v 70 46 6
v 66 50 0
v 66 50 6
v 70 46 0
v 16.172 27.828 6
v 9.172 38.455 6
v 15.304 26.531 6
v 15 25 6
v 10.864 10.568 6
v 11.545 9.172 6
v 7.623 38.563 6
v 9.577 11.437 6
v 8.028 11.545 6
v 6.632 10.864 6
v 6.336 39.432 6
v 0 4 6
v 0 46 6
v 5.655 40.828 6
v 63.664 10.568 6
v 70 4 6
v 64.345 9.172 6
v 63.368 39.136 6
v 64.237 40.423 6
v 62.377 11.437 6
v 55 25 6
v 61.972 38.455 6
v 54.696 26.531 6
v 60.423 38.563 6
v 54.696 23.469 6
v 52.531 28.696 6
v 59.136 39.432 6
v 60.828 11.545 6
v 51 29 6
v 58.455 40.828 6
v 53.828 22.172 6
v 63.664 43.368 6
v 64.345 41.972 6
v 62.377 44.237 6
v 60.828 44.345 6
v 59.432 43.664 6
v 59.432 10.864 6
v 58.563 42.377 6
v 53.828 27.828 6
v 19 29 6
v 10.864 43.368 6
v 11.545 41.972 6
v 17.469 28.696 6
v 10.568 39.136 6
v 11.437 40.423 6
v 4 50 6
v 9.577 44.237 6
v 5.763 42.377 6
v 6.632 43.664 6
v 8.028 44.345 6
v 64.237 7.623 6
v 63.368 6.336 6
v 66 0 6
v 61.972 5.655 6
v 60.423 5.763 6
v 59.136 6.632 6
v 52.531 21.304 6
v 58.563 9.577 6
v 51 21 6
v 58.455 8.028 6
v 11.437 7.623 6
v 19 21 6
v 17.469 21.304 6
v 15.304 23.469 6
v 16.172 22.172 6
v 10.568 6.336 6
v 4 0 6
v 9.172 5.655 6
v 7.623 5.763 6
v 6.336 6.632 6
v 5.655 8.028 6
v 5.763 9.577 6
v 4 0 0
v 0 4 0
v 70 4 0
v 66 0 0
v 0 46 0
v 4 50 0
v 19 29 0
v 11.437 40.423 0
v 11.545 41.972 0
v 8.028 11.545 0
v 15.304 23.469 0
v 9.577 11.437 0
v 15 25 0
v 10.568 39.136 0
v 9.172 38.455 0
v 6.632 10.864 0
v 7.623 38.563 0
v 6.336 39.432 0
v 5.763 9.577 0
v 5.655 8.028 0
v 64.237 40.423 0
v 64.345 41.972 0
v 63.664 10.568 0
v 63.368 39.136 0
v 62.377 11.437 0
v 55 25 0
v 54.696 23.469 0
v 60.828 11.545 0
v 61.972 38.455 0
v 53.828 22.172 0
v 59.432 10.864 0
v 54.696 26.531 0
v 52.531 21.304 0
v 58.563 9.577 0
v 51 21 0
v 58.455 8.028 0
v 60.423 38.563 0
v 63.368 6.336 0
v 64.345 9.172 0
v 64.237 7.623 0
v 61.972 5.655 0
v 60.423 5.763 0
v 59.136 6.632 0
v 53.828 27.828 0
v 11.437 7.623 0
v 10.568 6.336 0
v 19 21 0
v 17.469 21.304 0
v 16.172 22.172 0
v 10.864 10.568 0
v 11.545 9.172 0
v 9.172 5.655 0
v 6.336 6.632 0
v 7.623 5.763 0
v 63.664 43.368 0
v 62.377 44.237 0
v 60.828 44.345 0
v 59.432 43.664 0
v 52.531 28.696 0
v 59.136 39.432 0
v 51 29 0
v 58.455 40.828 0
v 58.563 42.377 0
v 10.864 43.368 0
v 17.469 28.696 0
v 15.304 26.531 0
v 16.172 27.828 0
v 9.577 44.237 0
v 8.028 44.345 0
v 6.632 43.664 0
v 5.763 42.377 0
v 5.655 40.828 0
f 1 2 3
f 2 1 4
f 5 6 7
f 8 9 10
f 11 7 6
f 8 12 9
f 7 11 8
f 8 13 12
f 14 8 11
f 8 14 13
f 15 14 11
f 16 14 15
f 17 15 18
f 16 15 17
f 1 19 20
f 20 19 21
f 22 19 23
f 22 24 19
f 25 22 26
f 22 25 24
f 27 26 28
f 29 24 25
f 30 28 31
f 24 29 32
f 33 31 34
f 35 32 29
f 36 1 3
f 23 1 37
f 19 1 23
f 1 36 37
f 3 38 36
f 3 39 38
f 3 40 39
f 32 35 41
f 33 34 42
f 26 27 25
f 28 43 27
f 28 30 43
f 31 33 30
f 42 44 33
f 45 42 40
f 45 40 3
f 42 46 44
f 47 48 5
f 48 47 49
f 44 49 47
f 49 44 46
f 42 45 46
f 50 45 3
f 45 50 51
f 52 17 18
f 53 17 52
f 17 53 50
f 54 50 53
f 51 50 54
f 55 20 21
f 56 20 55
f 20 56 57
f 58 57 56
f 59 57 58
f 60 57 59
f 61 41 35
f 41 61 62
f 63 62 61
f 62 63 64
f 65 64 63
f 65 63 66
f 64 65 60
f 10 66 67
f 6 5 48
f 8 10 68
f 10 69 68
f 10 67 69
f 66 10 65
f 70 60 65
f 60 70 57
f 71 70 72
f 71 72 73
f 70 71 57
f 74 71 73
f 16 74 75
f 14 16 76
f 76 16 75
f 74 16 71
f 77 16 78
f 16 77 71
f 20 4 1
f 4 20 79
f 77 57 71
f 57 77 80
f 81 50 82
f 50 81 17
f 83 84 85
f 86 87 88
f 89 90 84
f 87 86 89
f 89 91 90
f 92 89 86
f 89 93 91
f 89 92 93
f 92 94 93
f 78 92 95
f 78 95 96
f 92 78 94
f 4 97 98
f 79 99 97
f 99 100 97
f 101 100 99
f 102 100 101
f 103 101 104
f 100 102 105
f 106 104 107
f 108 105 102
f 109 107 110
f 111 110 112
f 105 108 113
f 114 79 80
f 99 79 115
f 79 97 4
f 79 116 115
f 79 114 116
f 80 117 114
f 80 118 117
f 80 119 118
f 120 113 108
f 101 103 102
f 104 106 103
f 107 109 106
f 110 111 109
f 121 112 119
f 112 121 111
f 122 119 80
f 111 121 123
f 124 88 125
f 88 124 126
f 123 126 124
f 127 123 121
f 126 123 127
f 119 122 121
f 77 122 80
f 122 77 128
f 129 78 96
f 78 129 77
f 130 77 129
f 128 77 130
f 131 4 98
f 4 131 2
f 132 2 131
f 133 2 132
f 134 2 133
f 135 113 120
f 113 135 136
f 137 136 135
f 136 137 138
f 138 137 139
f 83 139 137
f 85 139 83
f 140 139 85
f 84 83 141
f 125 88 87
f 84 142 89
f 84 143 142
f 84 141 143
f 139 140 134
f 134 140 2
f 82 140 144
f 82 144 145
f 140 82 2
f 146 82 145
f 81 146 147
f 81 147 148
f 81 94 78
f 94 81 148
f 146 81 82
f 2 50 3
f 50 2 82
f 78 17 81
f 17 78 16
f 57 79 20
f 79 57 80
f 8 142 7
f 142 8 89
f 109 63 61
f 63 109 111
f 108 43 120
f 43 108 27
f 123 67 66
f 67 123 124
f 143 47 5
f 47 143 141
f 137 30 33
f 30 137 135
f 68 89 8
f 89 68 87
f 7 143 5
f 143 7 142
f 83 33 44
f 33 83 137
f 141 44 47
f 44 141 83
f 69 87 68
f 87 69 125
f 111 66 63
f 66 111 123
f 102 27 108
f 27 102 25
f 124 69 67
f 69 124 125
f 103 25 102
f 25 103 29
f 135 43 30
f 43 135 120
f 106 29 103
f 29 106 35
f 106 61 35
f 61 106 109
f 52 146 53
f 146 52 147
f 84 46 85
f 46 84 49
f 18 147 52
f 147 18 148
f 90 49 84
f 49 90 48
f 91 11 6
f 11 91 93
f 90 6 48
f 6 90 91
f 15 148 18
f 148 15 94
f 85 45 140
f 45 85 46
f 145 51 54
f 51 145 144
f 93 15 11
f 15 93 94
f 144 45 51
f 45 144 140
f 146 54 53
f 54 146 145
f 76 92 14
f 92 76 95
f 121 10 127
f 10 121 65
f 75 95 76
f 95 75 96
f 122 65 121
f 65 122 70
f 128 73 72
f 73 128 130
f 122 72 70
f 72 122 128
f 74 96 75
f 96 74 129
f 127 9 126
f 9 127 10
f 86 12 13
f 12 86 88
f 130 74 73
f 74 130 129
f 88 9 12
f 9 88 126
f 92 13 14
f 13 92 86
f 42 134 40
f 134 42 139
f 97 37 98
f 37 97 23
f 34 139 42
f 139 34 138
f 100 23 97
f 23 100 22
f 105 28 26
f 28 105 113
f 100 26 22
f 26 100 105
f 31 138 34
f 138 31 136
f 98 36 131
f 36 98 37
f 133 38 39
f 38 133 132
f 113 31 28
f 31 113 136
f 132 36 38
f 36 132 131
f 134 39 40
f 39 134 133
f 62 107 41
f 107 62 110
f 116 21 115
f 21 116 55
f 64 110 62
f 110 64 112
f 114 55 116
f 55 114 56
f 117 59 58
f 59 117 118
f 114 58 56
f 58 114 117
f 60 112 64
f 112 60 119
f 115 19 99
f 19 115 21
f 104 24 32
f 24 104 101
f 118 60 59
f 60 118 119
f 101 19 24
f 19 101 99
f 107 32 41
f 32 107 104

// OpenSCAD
$fn = 32;

// ----------------------------------------------------------------------
// Bracket plate: slot plate 70 x 50
// ----------------------------------------------------------------------

// --- parameters (mm) ---
hole_r = 3;               // bolt hole radius
plate_t = 6;              // plate thickness, Z (extrusion height)
plate_l = 70;             // plate length
plate_w = 50;             // plate width
slot_l = 32;              // slot straight length
slot_r = 4;               // slot end radius

slot_len = slot_l + 2 * slot_r;
slot_w = 2 * slot_r;
hole_d2 = 2 * hole_r;

profile = [[4, 0], [66, 0], [70, 4], [70, 46], [66, 50], [4, 50], [0, 46], [0, 4]];  // primary outline, 8 points, counter clockwise
void_1 = [[51, 21], [52.531, 21.304], [53.828, 22.172], [54.696, 23.469], [55, 25], [54.696, 26.531], [53.828, 27.828], [52.531, 28.696], [51, 29], [19, 29], [17.469, 28.696], [16.172, 27.828], [15.304, 26.531], [15, 25], [15.304, 23.469], [16.172, 22.172], [17.469, 21.304], [19, 21]];  // grip slot, 18 points
void_2 = [[11.545, 41.972], [10.864, 43.368], [9.577, 44.237], [8.028, 44.345], [6.632, 43.664], [5.763, 42.377], [5.655, 40.828], [6.336, 39.432], [7.623, 38.563], [9.172, 38.455], [10.568, 39.136], [11.437, 40.423]];  // corner hole, 12 points
void_3 = [[11.545, 9.172], [10.864, 10.568], [9.577, 11.437], [8.028, 11.545], [6.632, 10.864], [5.763, 9.577], [5.655, 8.028], [6.336, 6.632], [7.623, 5.763], [9.172, 5.655], [10.568, 6.336], [11.437, 7.623]];  // corner hole, 12 points
void_4 = [[64.345, 41.972], [63.664, 43.368], [62.377, 44.237], [60.828, 44.345], [59.432, 43.664], [58.563, 42.377], [58.455, 40.828], [59.136, 39.432], [60.423, 38.563], [61.972, 38.455], [63.368, 39.136], [64.237, 40.423]];  // corner hole, 12 points
void_5 = [[64.345, 9.172], [63.664, 10.568], [62.377, 11.437], [60.828, 11.545], [59.432, 10.864], [58.563, 9.577], [58.455, 8.028], [59.136, 6.632], [60.423, 5.763], [61.972, 5.655], [63.368, 6.336], [64.237, 7.623]];  // corner hole, 12 points

// --- the one profile operation ---
difference() {
  linear_extrude(height = plate_t) polygon(points = profile);
  translate([0, 0, -1])
    linear_extrude(height = plate_t + 2) polygon(points = void_1);
  translate([0, 0, -1])
    linear_extrude(height = plate_t + 2) polygon(points = void_2);
  translate([0, 0, -1])
    linear_extrude(height = plate_t + 2) polygon(points = void_3);
  translate([0, 0, -1])
    linear_extrude(height = plate_t + 2) polygon(points = void_4);
  translate([0, 0, -1])
    linear_extrude(height = plate_t + 2) polygon(points = void_5);
}
